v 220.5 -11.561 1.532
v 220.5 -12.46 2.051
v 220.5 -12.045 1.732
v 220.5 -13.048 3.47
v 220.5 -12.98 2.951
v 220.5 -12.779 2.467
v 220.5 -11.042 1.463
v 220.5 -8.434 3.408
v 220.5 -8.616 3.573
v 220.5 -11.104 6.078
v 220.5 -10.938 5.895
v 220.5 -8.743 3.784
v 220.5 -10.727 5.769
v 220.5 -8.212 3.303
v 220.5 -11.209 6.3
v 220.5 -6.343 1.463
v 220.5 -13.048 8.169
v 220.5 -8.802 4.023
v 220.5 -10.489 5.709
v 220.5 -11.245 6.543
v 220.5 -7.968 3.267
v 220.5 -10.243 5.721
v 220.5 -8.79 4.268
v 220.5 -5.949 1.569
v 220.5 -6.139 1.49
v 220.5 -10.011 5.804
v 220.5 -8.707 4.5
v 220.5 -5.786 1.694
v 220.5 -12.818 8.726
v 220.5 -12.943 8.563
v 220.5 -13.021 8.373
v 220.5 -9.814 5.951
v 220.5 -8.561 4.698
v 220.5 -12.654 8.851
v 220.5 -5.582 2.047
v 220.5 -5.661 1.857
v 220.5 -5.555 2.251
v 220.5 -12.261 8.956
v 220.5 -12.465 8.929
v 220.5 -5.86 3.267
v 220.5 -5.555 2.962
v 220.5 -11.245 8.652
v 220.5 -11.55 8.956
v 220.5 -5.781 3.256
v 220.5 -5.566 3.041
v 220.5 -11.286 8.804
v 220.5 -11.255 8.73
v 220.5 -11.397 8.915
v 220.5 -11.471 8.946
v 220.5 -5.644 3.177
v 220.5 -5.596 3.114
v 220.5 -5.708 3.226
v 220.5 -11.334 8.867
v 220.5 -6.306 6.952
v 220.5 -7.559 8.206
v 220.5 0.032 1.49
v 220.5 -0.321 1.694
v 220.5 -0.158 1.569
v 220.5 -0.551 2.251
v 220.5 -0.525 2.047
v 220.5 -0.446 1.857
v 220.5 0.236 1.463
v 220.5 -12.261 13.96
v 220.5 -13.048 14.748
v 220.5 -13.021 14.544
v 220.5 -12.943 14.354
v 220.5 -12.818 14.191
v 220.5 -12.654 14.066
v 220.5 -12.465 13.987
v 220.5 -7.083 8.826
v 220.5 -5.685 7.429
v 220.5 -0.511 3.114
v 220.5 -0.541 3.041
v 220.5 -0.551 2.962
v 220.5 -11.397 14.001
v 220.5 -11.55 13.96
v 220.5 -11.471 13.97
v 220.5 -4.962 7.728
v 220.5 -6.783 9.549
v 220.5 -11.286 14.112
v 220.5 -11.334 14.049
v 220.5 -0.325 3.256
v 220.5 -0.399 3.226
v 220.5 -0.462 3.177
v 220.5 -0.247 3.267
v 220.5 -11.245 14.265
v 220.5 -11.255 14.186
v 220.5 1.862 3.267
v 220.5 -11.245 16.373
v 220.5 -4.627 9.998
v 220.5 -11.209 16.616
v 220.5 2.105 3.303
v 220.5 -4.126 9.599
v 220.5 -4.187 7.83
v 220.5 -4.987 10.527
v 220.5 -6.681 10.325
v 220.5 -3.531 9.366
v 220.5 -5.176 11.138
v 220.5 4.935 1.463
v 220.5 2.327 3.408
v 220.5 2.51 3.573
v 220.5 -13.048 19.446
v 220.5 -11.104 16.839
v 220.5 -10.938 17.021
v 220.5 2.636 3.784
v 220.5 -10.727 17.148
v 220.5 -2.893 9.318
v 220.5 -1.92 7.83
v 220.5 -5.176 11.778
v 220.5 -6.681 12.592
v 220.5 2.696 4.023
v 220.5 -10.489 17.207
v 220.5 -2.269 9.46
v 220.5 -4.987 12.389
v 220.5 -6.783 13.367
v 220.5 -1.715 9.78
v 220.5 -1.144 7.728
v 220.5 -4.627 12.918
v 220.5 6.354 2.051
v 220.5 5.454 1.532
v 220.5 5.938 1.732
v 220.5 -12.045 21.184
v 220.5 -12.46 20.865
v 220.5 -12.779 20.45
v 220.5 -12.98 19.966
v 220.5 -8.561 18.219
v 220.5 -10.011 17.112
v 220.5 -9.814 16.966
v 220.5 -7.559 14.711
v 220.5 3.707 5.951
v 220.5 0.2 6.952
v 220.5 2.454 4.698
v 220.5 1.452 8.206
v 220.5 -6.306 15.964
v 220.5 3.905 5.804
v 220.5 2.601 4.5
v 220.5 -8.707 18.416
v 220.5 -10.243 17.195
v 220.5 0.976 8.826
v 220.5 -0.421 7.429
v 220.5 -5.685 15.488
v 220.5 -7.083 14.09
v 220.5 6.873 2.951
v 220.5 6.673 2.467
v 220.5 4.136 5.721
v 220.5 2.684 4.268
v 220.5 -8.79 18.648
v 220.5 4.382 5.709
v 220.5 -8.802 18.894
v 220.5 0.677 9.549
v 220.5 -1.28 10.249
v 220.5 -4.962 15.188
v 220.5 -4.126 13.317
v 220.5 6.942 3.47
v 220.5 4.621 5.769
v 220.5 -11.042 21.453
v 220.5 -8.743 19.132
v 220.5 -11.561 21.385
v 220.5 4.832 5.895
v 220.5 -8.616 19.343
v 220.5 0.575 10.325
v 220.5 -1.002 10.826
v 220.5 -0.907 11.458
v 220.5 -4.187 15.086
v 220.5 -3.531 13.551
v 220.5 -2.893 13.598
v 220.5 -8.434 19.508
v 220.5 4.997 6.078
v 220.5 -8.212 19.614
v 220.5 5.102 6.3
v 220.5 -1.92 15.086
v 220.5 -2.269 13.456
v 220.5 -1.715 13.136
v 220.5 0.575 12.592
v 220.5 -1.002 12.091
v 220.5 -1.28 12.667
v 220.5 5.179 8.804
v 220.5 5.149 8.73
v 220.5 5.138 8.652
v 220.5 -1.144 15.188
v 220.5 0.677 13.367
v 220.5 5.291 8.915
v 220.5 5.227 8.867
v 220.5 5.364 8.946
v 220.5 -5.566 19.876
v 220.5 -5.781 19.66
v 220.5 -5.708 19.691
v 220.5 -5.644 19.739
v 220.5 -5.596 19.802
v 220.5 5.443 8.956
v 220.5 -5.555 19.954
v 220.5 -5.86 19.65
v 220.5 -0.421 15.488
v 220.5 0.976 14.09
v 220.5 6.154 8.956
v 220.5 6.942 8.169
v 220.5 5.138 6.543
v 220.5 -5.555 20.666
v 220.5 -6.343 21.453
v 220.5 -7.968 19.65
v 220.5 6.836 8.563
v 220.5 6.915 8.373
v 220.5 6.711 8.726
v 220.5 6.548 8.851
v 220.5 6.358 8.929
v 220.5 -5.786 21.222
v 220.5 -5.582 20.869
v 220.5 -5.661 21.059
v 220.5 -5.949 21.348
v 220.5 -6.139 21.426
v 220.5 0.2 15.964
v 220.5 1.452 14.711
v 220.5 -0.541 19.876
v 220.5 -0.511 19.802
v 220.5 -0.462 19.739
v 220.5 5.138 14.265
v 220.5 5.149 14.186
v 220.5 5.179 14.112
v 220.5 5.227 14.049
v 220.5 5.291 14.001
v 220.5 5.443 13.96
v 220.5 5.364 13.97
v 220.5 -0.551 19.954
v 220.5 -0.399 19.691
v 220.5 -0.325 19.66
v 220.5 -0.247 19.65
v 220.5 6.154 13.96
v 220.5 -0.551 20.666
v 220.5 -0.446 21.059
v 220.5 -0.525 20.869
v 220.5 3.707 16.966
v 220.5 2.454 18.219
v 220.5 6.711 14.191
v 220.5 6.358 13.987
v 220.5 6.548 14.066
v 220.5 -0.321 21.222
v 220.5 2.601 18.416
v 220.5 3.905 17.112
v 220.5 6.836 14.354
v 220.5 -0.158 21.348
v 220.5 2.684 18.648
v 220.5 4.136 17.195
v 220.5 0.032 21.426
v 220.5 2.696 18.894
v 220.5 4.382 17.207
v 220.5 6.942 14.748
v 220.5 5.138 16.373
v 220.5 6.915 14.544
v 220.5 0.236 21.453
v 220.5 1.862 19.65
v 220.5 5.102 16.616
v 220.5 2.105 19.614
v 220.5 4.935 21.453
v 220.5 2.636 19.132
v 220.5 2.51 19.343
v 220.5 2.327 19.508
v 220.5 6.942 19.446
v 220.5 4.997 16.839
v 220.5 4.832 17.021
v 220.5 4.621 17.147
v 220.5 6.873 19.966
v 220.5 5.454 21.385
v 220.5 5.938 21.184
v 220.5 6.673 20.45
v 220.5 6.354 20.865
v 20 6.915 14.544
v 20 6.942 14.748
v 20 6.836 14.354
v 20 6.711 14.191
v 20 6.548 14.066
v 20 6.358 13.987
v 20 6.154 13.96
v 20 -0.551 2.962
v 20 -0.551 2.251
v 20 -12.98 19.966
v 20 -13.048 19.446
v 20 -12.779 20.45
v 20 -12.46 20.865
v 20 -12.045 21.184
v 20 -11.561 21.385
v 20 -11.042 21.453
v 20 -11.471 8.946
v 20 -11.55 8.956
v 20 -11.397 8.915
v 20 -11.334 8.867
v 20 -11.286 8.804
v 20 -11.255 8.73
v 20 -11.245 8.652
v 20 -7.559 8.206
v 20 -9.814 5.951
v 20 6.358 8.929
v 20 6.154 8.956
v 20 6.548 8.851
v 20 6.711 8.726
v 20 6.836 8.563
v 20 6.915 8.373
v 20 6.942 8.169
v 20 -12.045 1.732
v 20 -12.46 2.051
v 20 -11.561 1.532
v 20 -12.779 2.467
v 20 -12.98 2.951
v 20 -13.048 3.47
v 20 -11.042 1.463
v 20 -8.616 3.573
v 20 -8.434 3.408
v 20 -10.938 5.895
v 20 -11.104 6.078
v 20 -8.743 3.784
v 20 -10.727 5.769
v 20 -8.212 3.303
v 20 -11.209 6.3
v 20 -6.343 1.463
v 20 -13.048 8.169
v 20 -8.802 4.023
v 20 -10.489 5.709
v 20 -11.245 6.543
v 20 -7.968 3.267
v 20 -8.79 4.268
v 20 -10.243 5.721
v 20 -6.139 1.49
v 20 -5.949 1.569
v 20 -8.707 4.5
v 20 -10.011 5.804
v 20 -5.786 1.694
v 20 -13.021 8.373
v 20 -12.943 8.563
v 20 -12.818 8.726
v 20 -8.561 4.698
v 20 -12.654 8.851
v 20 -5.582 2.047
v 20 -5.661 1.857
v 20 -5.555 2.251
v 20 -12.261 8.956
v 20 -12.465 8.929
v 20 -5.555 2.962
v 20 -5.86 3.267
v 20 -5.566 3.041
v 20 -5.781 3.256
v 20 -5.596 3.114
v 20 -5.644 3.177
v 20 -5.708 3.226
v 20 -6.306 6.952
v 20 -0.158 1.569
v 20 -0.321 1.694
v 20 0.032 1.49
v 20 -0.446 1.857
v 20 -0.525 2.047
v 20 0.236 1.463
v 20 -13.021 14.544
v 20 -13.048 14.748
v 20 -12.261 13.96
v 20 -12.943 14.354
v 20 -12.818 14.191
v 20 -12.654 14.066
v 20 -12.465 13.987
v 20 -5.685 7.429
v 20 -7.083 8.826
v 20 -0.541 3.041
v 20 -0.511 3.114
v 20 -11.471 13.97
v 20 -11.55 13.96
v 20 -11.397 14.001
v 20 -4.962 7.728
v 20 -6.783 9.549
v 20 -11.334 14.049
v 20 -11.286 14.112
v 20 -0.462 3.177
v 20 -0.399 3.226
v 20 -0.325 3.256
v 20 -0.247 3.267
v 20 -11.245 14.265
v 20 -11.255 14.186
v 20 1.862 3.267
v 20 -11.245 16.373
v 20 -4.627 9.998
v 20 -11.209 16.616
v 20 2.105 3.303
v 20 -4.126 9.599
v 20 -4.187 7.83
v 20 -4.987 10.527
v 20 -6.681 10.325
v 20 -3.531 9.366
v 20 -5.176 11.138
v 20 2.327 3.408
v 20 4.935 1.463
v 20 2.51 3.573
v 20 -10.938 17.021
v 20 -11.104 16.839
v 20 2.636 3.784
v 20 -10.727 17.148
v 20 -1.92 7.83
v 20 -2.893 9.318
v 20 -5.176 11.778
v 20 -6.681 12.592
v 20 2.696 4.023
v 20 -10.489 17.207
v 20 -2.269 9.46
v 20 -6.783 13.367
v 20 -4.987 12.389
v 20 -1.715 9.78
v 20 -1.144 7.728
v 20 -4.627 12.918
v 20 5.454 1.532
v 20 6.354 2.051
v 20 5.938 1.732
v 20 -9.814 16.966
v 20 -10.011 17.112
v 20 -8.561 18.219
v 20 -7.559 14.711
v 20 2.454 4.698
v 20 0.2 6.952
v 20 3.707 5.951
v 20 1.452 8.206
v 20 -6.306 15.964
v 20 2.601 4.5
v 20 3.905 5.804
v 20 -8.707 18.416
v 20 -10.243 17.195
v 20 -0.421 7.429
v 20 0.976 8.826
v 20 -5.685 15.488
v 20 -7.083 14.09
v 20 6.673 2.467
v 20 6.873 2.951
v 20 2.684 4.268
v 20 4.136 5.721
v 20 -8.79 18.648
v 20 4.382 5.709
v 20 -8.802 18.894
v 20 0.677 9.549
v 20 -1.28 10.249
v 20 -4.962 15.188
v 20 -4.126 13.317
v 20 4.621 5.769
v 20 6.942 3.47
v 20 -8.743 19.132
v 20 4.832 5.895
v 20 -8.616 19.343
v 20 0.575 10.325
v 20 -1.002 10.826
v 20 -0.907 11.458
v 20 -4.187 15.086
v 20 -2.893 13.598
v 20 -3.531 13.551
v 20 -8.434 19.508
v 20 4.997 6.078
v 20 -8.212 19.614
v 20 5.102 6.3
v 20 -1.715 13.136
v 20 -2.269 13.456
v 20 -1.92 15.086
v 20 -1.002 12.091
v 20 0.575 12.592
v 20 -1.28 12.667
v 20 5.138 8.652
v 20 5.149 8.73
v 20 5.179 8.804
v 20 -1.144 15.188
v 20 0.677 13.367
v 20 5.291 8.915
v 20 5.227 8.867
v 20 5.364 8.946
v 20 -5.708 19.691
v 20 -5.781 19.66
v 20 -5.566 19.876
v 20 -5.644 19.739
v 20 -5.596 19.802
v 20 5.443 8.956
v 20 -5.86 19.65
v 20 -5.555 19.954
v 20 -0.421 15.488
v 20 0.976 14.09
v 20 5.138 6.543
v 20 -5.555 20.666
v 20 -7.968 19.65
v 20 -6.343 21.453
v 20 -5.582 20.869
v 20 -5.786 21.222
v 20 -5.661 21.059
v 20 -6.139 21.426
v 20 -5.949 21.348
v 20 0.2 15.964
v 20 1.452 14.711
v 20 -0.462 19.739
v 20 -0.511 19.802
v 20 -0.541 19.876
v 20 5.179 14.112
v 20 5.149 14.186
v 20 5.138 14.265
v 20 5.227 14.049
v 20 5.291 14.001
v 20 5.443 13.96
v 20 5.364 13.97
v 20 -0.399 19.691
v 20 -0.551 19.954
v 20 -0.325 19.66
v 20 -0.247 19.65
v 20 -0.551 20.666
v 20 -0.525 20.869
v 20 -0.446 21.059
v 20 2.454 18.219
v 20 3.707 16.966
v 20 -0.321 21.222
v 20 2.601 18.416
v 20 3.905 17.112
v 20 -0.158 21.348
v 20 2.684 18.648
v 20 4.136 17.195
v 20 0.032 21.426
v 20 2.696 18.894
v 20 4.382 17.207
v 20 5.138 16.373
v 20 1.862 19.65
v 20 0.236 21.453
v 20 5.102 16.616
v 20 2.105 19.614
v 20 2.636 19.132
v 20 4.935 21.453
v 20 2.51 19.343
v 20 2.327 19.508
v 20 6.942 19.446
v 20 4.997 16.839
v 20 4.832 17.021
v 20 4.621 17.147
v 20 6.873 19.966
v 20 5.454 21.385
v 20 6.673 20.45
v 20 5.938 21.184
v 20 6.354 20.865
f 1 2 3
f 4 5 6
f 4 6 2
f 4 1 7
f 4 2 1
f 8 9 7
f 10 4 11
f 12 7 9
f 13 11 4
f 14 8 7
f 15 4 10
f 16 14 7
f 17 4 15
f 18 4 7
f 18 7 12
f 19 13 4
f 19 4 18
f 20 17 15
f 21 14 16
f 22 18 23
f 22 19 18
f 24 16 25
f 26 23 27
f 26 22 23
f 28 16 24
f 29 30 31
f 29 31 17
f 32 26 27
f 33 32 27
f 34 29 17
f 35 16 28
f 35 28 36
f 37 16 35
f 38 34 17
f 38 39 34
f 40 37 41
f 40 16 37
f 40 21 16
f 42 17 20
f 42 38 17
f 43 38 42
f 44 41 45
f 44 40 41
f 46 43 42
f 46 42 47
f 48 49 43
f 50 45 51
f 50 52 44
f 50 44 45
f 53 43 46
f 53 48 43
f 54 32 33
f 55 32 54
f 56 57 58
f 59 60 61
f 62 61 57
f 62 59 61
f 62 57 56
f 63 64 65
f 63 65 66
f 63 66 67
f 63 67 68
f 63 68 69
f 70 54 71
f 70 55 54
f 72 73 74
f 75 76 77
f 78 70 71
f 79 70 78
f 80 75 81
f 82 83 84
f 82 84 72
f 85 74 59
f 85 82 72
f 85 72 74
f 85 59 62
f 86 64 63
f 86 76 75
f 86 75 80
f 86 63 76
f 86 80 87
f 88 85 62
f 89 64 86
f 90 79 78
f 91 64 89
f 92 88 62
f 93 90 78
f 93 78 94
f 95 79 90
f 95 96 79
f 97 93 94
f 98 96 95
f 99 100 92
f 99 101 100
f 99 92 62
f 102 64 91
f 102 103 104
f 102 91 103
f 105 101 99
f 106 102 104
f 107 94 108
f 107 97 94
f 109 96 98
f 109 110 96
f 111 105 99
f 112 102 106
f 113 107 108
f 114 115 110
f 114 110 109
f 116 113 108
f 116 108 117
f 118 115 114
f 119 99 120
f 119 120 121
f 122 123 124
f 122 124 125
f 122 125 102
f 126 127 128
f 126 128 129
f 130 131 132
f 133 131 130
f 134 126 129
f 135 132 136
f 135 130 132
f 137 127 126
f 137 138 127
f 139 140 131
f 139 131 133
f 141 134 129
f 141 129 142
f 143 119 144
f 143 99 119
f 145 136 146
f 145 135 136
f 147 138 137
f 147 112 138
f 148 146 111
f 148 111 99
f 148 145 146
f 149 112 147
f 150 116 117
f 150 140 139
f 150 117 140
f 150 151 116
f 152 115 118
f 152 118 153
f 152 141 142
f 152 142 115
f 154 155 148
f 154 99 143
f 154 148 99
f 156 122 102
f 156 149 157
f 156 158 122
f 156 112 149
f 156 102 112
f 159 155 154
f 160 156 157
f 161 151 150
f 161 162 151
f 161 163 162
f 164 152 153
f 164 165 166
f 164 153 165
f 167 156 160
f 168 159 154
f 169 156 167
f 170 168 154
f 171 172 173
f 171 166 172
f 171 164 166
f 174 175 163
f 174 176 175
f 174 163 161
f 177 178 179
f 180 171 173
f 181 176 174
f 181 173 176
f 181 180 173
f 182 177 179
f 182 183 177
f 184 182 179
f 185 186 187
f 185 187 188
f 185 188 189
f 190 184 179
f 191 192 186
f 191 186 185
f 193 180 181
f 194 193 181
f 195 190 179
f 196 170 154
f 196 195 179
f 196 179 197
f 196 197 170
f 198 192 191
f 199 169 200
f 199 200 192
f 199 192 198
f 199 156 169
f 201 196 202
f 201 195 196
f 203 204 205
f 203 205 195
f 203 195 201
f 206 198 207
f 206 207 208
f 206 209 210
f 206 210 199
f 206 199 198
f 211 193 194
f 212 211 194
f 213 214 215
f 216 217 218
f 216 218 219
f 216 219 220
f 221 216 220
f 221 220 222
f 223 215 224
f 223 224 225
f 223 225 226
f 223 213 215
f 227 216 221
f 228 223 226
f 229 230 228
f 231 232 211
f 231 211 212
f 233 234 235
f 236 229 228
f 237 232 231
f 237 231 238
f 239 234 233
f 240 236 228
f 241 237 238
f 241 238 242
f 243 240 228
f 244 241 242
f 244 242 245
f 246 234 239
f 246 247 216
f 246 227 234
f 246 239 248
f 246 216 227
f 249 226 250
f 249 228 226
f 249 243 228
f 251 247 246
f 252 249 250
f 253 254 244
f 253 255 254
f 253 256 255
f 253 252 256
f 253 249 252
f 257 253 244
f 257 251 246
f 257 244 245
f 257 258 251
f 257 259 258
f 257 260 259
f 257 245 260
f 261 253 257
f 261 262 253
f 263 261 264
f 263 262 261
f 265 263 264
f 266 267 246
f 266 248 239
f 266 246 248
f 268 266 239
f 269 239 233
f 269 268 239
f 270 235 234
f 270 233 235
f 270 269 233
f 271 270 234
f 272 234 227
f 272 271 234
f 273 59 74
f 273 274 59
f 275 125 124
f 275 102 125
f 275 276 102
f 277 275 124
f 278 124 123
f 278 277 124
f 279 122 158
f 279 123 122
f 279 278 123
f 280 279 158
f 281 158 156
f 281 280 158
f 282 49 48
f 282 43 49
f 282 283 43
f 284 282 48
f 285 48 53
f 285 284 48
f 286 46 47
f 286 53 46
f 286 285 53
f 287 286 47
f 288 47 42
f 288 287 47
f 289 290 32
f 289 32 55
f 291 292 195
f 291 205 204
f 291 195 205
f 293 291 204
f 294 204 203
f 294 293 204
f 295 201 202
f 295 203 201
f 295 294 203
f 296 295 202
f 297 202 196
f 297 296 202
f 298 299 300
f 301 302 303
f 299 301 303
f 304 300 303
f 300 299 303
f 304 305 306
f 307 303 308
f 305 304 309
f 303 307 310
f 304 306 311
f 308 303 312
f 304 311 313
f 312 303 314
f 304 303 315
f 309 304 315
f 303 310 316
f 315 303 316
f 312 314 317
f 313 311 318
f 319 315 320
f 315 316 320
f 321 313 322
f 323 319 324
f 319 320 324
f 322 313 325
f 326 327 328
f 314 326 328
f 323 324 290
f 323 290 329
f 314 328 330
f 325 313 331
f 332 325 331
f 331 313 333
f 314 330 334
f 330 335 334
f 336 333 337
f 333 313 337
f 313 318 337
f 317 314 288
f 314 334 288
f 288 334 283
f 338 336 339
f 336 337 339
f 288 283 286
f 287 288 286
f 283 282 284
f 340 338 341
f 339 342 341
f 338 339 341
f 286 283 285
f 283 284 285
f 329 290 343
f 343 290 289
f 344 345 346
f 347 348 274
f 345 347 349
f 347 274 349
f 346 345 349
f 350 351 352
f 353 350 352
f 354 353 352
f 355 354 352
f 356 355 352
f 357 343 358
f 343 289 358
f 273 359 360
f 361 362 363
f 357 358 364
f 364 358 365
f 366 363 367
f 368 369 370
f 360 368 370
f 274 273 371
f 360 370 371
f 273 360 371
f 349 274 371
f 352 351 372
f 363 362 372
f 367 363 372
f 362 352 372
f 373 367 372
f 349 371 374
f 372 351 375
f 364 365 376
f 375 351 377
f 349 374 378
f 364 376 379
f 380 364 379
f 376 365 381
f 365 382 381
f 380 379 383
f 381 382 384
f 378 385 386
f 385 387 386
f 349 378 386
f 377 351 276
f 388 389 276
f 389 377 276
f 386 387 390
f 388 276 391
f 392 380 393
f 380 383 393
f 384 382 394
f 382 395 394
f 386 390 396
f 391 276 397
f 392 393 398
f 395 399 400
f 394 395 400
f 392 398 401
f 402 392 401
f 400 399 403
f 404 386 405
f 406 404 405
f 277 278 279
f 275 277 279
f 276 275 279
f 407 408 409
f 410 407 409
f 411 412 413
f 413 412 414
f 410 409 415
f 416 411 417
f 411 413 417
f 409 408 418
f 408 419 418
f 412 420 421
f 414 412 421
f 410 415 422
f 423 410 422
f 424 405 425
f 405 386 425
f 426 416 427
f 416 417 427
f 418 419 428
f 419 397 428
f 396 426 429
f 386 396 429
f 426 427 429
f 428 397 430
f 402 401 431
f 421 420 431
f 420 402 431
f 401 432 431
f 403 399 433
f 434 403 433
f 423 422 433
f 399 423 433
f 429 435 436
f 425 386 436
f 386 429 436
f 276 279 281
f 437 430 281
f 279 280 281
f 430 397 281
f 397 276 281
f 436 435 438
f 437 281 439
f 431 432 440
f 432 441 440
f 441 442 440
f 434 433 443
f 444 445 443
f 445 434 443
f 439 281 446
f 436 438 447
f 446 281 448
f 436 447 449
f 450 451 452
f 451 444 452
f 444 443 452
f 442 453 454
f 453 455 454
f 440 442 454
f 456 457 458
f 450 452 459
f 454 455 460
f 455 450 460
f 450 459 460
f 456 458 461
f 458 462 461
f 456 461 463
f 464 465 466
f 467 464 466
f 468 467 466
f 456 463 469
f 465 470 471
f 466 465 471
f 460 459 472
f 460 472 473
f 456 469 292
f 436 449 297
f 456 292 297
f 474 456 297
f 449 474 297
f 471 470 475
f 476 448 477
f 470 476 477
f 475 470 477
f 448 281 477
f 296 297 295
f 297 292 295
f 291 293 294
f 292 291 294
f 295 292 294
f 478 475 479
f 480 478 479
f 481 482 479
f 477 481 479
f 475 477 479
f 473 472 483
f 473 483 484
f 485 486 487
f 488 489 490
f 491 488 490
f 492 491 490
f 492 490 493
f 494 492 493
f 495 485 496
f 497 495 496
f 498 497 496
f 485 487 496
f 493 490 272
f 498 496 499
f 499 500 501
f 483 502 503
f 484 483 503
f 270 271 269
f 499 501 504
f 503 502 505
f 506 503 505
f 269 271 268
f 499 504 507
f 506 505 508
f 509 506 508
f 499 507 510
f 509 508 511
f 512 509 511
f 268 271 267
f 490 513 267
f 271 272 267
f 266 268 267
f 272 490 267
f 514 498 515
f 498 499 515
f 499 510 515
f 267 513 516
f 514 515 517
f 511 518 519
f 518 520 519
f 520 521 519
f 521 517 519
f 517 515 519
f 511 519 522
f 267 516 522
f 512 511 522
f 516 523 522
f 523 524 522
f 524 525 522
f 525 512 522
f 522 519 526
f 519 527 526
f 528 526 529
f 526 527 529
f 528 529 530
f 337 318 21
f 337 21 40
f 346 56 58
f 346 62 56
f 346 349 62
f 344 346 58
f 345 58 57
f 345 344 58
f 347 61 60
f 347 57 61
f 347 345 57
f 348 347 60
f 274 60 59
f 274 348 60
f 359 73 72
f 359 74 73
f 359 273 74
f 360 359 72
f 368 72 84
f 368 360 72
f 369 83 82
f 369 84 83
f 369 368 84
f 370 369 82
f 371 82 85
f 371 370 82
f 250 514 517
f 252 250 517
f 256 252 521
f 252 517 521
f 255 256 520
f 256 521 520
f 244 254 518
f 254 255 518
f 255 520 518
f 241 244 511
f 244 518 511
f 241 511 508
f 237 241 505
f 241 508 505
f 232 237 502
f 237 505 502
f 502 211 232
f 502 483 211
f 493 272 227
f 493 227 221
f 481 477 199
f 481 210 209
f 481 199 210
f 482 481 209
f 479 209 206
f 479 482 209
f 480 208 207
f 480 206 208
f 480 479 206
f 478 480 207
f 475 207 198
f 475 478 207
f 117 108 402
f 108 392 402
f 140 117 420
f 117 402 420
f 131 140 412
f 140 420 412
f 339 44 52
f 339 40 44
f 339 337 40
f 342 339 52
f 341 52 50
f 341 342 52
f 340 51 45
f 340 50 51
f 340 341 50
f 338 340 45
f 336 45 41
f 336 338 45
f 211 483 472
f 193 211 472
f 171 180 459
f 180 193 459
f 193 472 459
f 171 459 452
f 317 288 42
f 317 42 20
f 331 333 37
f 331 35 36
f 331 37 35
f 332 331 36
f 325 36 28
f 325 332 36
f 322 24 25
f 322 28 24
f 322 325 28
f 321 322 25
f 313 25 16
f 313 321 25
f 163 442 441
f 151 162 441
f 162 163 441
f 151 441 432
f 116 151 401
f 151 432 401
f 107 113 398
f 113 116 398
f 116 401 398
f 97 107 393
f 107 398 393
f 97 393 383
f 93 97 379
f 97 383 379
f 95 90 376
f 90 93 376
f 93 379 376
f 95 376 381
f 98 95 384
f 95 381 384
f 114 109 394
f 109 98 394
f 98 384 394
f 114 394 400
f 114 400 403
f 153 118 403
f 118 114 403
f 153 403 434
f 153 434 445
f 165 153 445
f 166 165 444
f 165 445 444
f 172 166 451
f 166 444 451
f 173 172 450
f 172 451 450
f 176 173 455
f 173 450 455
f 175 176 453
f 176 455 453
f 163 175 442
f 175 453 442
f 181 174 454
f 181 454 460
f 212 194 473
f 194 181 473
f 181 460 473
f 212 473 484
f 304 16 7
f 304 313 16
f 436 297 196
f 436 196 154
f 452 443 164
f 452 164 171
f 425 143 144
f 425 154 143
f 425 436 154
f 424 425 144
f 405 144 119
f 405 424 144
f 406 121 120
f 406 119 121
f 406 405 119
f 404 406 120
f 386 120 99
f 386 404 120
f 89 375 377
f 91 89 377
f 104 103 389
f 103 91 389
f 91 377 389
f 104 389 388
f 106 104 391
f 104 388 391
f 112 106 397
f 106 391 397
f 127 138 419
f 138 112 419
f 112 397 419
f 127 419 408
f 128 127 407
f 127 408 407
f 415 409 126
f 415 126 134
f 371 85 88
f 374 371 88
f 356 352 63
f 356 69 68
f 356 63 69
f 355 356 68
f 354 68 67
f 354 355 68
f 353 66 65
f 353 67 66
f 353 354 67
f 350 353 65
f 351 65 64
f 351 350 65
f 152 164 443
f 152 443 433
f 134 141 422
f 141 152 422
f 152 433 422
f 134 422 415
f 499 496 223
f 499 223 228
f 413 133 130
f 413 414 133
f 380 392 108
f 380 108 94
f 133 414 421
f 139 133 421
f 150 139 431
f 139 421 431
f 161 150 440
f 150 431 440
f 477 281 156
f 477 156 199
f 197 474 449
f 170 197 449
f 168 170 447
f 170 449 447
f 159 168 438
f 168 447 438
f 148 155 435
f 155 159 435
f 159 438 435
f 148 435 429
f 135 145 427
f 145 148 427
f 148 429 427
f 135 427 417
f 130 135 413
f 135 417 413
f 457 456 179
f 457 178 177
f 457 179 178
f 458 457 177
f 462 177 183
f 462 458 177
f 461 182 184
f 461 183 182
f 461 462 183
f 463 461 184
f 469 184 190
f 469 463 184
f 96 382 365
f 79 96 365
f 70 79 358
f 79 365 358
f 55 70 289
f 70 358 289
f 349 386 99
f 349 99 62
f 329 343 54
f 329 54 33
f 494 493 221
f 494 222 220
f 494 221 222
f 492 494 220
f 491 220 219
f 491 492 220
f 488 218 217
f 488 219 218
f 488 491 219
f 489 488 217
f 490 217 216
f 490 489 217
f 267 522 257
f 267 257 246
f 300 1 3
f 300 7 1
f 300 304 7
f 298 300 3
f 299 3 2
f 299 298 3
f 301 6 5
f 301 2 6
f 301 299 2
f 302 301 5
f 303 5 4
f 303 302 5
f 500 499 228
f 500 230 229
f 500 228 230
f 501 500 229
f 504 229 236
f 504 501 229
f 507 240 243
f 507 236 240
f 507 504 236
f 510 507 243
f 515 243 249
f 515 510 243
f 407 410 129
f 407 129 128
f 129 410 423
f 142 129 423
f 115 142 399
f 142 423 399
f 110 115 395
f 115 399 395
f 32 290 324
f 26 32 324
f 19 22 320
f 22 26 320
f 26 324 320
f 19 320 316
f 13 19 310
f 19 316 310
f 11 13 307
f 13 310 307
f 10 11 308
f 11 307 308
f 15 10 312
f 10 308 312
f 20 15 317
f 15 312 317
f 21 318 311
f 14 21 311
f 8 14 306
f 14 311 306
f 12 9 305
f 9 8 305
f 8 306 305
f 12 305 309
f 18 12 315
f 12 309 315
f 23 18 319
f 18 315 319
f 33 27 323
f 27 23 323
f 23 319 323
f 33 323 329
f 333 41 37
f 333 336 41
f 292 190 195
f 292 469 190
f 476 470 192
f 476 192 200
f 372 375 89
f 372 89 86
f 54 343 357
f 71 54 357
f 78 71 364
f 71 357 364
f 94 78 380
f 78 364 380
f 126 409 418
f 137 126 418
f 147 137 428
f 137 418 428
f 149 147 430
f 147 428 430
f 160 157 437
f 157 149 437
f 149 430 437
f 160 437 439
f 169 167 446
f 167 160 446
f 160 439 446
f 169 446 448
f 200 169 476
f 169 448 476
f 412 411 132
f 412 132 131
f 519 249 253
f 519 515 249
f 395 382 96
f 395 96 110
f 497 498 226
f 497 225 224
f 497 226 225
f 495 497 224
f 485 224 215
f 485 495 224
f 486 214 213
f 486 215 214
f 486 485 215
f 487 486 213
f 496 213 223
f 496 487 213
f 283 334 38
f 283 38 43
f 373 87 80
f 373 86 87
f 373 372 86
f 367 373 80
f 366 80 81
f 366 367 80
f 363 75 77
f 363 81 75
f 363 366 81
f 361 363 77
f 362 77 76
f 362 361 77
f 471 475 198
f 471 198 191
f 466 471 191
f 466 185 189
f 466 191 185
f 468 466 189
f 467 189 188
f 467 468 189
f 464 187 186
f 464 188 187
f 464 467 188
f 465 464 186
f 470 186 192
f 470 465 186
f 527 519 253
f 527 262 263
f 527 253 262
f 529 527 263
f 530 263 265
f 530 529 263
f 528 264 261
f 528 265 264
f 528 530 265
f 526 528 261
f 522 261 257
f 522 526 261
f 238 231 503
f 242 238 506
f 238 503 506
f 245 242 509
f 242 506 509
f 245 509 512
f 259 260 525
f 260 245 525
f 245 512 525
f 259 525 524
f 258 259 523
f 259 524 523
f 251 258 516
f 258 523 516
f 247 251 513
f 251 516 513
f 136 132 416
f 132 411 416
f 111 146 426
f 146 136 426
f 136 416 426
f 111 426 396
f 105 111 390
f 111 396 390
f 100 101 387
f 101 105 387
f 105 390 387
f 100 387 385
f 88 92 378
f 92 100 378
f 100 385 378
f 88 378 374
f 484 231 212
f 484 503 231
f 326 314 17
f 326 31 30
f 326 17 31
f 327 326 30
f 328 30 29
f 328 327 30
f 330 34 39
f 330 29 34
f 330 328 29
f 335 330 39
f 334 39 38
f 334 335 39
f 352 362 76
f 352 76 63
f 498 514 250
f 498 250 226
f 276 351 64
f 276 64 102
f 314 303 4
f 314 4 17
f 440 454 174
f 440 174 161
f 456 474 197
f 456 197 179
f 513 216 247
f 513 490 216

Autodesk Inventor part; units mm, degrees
ref_plane "XZ Plane" through (0, 0, 0) normal (0, 1, 0) x (-1, 0, 0)
ref_plane "Start Plane" through (20, 0, 0) normal (1, 0, 0) x (0, 1, 0)
ref_plane "End Plane" through (220.5, 0, 0) normal (1, 0, 0) x (0, 1, 0)
sketch "Sketch" plane through (0, 0, 0) normal (1, 0, 0) x (0, 1, 0)
  circle A0 centre (-3.0533, 11.4582) radius 2.1463
  line L0 (2.4543, 4.6976) -> (0.1995, 6.9525)
  arc A1 (1.8616, 3.2667) -> (2.4543, 4.6976) centre (1.8616, 4.1049) ccw
  line L1 (-0.2466, 3.2667) -> (1.8616, 3.2667)
  arc A2 (-0.2466, 3.2667) -> (-0.5514, 2.9619) centre (-0.2466, 2.9619) ccw
  line L2 (-0.5514, 2.2507) -> (-0.5514, 2.9619)
  arc A3 (-0.5514, 2.2507) -> (0.236, 1.4633) centre (0.236, 2.2507) ccw
  line L3 (4.935, 1.4633) -> (0.236, 1.4633)
  arc A4 (4.935, 1.4633) -> (6.9416, 3.4699) centre (4.935, 3.4699) ccw
  line L4 (6.9416, 8.1689) -> (6.9416, 3.4699)
  arc A5 (6.9416, 8.1689) -> (6.1542, 8.9563) centre (6.1542, 8.1689) ccw
  line L5 (5.443, 8.9563) -> (6.1542, 8.9563)
  arc A6 (5.443, 8.9563) -> (5.1382, 8.6515) centre (5.443, 8.6515) ccw
  line L6 (5.1382, 6.5433) -> (5.1382, 8.6515)
  arc A7 (3.7073, 5.9506) -> (5.1382, 6.5433) centre (4.3, 6.5433) ccw
  line L7 (1.4525, 8.2055) -> (3.7073, 5.9506)
  arc A8 (0.5746, 10.3248) -> (1.4525, 8.2055) centre (3.5718, 10.3248) ccw
  line L8 (0.5746, 12.5917) -> (0.5746, 10.3248)
  arc A9 (1.4525, 14.711) -> (0.5746, 12.5917) centre (3.5718, 12.5917) ccw
  line L9 (3.7073, 16.9658) -> (1.4525, 14.711)
  arc A10 (5.1382, 16.3731) -> (3.7073, 16.9658) centre (4.3, 16.3731) ccw
  line L10 (5.1382, 14.2649) -> (5.1382, 16.3731)
  arc A11 (5.1382, 14.2649) -> (5.443, 13.9601) centre (5.443, 14.2649) ccw
  line L11 (6.1542, 13.9601) -> (5.443, 13.9601)
  arc A12 (6.1542, 13.9601) -> (6.9416, 14.7475) centre (6.1542, 14.7475) ccw
  line L12 (6.9416, 19.4465) -> (6.9416, 14.7475)
  arc A13 (6.9416, 19.4465) -> (4.935, 21.4531) centre (4.935, 19.4465) ccw
  line L13 (0.236, 21.4531) -> (4.935, 21.4531)
  arc A14 (0.236, 21.4531) -> (-0.5514, 20.6657) centre (0.236, 20.6657) ccw
  line L14 (-0.5514, 19.9545) -> (-0.5514, 20.6657)
  arc A15 (-0.5514, 19.9545) -> (-0.2466, 19.6497) centre (-0.2466, 19.9545) ccw
  line L15 (1.8616, 19.6497) -> (-0.2466, 19.6497)
  arc A16 (2.4543, 18.2188) -> (1.8616, 19.6497) centre (1.8616, 18.8115) ccw
  line L16 (0.1995, 15.964) -> (2.4543, 18.2188)
  arc A17 (-1.9199, 15.0861) -> (0.1995, 15.964) centre (-1.9199, 18.0833) ccw
  line L17 (-4.1867, 15.0861) -> (-1.9199, 15.0861)
  arc A18 (-6.306, 15.964) -> (-4.1867, 15.0861) centre (-4.1867, 18.0833) ccw
  line L18 (-8.5609, 18.2188) -> (-6.306, 15.964)
  arc A19 (-7.9682, 19.6497) -> (-8.5609, 18.2188) centre (-7.9682, 18.8115) ccw
  line L19 (-5.86, 19.6497) -> (-7.9682, 19.6497)
  arc A20 (-5.86, 19.6497) -> (-5.5552, 19.9545) centre (-5.86, 19.9545) ccw
  line L20 (-5.5552, 20.6657) -> (-5.5552, 19.9545)
  arc A21 (-5.5552, 20.6657) -> (-6.3426, 21.4531) centre (-6.3426, 20.6657) ccw
  line L21 (-11.0416, 21.4531) -> (-6.3426, 21.4531)
  arc A22 (-11.0416, 21.4531) -> (-13.0482, 19.4465) centre (-11.0416, 19.4465) ccw
  line L22 (-13.0482, 14.7475) -> (-13.0482, 19.4465)
  arc A23 (-13.0482, 14.7475) -> (-12.2608, 13.9601) centre (-12.2608, 14.7475) ccw
  line L23 (-11.5496, 13.9601) -> (-12.2608, 13.9601)
  arc A24 (-11.5496, 13.9601) -> (-11.2448, 14.2649) centre (-11.5496, 14.2649) ccw
  line L24 (-11.2448, 16.3731) -> (-11.2448, 14.2649)
  arc A25 (-9.8139, 16.9658) -> (-11.2448, 16.3731) centre (-10.4066, 16.3731) ccw
  line L25 (-7.559, 14.711) -> (-9.8139, 16.9658)
  arc A26 (-6.6812, 12.5917) -> (-7.559, 14.711) centre (-9.6784, 12.5917) ccw
  line L26 (-6.6812, 10.3248) -> (-6.6812, 12.5917)
  arc A27 (-7.559, 8.2055) -> (-6.6812, 10.3248) centre (-9.6784, 10.3248) ccw
  line L27 (-9.8139, 5.9506) -> (-7.559, 8.2055)
  arc A28 (-11.2448, 6.5433) -> (-9.8139, 5.9506) centre (-10.4066, 6.5433) ccw
  line L28 (-11.2448, 8.6515) -> (-11.2448, 6.5433)
  arc A29 (-11.2448, 8.6515) -> (-11.5496, 8.9563) centre (-11.5496, 8.6515) ccw
  line L29 (-12.2608, 8.9563) -> (-11.5496, 8.9563)
  arc A30 (-12.2608, 8.9563) -> (-13.0482, 8.1689) centre (-12.2608, 8.1689) ccw
  line L30 (-13.0482, 3.4699) -> (-13.0482, 8.1689)
  arc A31 (-13.0482, 3.4699) -> (-11.0416, 1.4633) centre (-11.0416, 3.4699) ccw
  line L31 (-6.3426, 1.4633) -> (-11.0416, 1.4633)
  arc A32 (-6.3426, 1.4633) -> (-5.5552, 2.2507) centre (-6.3426, 2.2507) ccw
  line L32 (-5.5552, 2.9619) -> (-5.5552, 2.2507)
  arc A33 (-5.5552, 2.9619) -> (-5.86, 3.2667) centre (-5.86, 2.9619) ccw
  line L33 (-7.9682, 3.2667) -> (-5.86, 3.2667)
  arc A34 (-8.5609, 4.6976) -> (-7.9682, 3.2667) centre (-7.9682, 4.1049) ccw
  line L34 (-6.306, 6.9525) -> (-8.5609, 4.6976)
  arc A35 (-4.1867, 7.8303) -> (-6.306, 6.9525) centre (-4.1867, 4.8331) ccw
  line L35 (-1.9199, 7.8303) -> (-4.1867, 7.8303)
  arc A36 (0.1995, 6.9525) -> (-1.9199, 7.8303) centre (-1.9199, 4.8331) ccw
  point P0 (0, 0)
extrude "Body" add sketch "Sketch" along normal up to surface (200.5 mm away) from surface at 20
sketch "Sketch2" plane through (0, 0, 0) normal (1, 0, 0) x (0, 1, 0)
  line L0 (0, 0) -> (10, 0)
ref_plane "Work Plane3" through (0, 0, 0) normal (0, 0, -1) x (0, 1, 0)
sketch "Sketch3" plane through (0, 0, 0) normal (0, 0, -1) x (0, 1, 0)
  line L0 (-2, 20) -> (12, 20)
  line L1 (-2, 220.5) -> (12, 220.5)
  dimension "d7" = 200.5
equation "\"G_OFFSET_START\" = -20"
equation "\"G_OFFSET_END\" = -20"
equation "\"d2\" = -G_OFFSET_START"
equation "\"d3\" = length + G_OFFSET_END"
equation "\"G_L\" = d7"
equation "\"length\" = 240.5"
properties part number "Generic-1"
